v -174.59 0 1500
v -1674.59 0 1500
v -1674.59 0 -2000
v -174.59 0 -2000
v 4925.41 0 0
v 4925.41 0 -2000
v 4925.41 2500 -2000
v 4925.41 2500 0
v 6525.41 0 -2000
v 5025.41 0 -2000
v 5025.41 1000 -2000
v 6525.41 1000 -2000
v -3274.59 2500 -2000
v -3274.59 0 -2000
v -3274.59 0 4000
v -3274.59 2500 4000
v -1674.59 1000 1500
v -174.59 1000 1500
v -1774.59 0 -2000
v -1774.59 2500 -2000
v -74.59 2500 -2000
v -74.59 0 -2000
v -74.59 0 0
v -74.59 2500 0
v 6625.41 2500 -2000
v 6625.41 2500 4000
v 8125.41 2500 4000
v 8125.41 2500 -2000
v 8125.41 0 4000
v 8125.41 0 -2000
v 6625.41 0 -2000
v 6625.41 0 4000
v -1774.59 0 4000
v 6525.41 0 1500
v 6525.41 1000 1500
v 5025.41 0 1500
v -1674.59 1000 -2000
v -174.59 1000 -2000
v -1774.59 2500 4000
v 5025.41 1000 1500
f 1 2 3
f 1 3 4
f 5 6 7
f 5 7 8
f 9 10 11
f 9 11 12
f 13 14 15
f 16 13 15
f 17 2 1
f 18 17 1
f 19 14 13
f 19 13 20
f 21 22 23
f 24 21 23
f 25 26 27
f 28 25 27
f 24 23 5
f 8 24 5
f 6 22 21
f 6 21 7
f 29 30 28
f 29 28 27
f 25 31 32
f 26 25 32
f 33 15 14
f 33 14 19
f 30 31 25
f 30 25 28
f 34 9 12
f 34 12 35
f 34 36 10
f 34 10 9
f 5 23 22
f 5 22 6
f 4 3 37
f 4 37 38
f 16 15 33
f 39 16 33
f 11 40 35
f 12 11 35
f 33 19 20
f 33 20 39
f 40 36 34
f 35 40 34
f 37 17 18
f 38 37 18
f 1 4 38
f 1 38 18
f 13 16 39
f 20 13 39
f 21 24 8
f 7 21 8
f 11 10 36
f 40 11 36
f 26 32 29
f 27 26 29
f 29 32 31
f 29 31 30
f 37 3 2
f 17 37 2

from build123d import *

# Parameters (mm, degrees)
F0_W     = 5000
F0_H     = 2000
F3_DEPTH = 2500
F2_W     = 1500
F2_H     = 3500
F4_DEPTH = 1000
F2_H_2   = 6000
F5_DEPTH = 2500


with BuildPart() as f3:
    # F0 (on Front) → F3 (new body)
    with BuildSketch(Plane.XZ):
        with Locations((2425.410382, -1000)):
            Rectangle(F0_W, F0_H)
    extrude(amount=-F3_DEPTH)


with BuildPart() as f4:
    # F2 (on Front) → F4 (new body)
    with BuildSketch(Plane.XZ):
        with Locations((-924.589618, -250)):
            Rectangle(F2_W, F2_H)
        with Locations((5775.410382, -250)):
            Rectangle(F2_W, F2_H)
    extrude(amount=-F4_DEPTH)


with BuildPart() as f5:
    # F2 (on Front) → F5 (new body)
    with BuildSketch(Plane.XZ):
        with Locations((-2524.589618, 1000)):
            Rectangle(F2_W, F2_H_2)
        with Locations((7375.410382, 1000)):
            Rectangle(F2_W, F2_H_2)
    extrude(amount=-F5_DEPTH)


solid = Compound([f3.part, f4.part, f5.part])
